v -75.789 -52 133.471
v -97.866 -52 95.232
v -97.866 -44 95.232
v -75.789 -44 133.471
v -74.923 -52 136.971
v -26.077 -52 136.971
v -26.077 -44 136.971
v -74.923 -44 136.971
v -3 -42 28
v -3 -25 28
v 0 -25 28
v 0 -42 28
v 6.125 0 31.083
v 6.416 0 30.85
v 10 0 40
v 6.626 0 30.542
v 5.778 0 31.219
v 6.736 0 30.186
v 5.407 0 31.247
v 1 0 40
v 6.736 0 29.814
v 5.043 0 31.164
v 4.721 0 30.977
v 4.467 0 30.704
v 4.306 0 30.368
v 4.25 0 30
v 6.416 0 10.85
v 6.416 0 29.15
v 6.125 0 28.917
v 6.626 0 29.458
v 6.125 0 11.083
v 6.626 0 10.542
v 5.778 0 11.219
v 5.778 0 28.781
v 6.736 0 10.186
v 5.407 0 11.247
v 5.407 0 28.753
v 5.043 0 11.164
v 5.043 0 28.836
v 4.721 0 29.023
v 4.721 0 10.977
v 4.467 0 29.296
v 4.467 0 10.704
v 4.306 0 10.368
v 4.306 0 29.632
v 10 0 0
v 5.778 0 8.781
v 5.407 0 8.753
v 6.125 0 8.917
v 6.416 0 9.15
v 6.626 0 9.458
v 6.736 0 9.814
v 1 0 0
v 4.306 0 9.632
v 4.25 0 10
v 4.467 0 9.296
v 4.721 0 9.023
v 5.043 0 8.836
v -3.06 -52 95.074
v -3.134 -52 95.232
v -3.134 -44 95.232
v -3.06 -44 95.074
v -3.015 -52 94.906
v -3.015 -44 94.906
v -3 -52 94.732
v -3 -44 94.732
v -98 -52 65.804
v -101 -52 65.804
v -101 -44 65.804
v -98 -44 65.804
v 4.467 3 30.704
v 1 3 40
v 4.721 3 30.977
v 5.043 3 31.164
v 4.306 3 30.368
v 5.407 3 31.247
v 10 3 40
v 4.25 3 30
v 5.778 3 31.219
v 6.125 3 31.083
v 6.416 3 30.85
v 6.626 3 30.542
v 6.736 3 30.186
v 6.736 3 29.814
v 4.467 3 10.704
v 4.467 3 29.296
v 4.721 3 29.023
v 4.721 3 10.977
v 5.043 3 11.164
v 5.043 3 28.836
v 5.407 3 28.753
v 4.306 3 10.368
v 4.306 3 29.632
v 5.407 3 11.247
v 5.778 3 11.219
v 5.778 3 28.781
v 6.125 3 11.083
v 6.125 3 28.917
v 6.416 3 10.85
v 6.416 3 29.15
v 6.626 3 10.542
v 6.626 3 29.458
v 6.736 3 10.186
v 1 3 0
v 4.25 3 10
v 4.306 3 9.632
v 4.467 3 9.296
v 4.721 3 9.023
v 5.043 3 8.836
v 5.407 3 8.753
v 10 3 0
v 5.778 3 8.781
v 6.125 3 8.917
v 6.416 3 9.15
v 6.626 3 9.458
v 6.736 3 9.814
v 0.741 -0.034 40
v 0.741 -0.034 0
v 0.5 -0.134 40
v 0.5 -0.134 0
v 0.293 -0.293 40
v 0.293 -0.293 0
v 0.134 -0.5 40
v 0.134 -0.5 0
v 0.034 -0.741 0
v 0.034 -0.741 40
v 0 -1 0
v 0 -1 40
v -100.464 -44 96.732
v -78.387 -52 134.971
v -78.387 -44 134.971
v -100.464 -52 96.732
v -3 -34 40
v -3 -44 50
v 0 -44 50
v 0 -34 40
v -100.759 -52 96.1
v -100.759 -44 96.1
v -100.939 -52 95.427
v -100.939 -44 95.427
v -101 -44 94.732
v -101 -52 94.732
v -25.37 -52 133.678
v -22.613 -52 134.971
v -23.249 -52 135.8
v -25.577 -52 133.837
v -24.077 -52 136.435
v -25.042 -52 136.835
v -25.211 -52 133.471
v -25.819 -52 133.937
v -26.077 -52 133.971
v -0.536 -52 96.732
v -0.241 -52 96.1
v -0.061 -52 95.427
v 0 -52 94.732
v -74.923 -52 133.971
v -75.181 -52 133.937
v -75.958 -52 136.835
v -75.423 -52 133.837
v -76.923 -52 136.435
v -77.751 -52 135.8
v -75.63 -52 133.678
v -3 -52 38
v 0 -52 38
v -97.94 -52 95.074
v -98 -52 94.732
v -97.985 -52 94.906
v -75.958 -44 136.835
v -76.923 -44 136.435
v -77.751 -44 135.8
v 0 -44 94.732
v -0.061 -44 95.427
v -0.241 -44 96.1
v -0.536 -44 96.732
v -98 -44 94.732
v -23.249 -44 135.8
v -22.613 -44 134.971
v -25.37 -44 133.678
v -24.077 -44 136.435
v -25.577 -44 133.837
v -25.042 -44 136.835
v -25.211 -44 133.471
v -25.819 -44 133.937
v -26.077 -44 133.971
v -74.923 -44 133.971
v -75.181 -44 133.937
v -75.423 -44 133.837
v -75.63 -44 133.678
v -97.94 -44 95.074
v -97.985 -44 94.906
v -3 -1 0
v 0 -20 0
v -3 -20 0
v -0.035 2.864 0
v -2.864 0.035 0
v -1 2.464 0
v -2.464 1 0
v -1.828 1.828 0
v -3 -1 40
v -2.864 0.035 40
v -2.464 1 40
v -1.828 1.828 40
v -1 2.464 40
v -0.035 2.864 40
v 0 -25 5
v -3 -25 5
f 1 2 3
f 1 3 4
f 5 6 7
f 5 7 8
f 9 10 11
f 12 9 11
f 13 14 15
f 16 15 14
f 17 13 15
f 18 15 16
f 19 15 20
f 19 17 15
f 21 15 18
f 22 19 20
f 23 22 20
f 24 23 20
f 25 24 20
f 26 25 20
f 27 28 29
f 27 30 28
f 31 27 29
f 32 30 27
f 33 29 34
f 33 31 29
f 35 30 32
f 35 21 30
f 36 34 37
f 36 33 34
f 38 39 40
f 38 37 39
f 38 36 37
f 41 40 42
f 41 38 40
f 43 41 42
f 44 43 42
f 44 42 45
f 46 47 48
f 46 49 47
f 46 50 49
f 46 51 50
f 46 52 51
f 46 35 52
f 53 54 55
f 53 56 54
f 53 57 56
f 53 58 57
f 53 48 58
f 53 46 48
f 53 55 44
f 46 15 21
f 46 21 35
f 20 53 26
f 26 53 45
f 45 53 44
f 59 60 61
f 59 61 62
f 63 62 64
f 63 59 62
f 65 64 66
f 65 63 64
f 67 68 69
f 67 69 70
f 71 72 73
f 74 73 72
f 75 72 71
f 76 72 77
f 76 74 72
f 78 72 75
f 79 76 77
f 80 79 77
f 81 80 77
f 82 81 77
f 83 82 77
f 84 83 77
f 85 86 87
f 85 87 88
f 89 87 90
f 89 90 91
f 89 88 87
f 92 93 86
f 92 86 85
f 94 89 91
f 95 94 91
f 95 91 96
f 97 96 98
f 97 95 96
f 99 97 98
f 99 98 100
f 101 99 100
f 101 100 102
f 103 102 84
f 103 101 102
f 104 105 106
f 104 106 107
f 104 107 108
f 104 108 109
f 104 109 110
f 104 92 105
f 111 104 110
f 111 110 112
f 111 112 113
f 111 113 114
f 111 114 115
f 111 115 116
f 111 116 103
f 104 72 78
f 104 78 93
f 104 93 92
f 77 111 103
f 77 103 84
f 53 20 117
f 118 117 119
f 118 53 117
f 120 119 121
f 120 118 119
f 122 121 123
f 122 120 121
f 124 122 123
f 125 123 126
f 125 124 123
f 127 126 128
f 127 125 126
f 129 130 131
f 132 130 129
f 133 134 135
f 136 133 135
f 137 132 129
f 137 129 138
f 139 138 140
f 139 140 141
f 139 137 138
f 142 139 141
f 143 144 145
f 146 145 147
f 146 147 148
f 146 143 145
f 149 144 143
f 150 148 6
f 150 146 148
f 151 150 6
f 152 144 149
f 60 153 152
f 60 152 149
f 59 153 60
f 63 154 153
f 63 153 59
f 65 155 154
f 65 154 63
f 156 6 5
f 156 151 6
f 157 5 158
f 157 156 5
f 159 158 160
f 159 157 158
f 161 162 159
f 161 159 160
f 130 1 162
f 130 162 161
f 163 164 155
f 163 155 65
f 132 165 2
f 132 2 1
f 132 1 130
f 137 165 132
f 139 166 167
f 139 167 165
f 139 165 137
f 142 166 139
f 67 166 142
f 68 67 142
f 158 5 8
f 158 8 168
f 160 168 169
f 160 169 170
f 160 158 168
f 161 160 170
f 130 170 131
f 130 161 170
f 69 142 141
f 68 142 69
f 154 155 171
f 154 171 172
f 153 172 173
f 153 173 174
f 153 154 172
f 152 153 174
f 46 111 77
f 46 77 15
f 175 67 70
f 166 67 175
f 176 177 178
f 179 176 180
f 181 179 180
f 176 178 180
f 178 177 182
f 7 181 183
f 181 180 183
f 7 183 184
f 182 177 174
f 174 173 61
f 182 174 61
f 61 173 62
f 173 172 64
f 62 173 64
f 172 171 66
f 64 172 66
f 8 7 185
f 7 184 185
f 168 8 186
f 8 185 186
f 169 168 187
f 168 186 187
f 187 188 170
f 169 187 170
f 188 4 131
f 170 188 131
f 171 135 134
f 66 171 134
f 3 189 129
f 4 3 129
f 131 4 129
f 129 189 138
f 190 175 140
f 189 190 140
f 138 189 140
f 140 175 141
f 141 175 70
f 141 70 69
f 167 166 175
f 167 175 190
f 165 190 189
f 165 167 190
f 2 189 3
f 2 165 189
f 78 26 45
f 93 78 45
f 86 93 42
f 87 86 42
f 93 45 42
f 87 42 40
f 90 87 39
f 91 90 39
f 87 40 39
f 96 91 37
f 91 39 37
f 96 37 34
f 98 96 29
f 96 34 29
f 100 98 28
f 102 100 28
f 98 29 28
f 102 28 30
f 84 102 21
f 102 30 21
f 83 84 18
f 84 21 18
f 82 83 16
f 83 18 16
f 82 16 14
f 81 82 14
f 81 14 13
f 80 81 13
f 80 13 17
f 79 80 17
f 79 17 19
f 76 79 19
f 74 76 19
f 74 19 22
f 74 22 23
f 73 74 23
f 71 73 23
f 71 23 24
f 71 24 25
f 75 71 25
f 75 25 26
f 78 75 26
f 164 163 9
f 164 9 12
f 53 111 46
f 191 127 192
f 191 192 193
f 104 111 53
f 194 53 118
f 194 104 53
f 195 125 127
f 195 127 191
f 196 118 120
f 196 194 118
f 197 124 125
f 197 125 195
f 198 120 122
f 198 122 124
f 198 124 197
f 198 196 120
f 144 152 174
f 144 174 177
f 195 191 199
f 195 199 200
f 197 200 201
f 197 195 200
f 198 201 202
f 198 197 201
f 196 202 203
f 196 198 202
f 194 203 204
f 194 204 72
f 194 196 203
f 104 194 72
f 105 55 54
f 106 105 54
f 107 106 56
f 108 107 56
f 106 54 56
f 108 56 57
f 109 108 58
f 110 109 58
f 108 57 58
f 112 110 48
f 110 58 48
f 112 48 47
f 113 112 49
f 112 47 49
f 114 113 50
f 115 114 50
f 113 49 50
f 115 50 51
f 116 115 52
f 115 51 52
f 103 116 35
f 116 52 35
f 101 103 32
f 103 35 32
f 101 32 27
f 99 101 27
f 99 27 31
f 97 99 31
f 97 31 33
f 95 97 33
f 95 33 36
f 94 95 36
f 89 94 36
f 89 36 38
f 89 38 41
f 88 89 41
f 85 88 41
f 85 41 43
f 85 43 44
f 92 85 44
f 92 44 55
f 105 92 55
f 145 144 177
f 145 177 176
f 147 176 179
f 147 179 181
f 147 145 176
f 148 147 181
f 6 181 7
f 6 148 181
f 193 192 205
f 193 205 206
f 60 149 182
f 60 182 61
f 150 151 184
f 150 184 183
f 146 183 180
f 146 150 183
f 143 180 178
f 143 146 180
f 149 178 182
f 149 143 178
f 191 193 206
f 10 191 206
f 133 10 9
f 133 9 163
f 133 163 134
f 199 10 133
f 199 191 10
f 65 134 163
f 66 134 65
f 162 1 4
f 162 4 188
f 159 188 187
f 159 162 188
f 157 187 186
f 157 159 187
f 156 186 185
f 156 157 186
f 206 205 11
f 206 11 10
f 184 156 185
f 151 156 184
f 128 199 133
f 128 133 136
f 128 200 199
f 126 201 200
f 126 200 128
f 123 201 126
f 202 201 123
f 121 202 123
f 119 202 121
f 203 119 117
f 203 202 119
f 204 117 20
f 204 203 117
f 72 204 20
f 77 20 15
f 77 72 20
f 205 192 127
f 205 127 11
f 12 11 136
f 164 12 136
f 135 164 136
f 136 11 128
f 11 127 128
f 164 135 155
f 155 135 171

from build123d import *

# Parameters (mm, degrees)
SM_BASE_FLANGE_1_DEPTH           = 40
M3X0_5_1_D                       = 2.5
SKETCH_22_W                      = 3
SKETCH_22_H                      = 12
EXTRUDE_6_DEPTH                  = 19
SKETCH_23_W                      = 3
SKETCH_23_H                      = 67
EXTRUDE_7_DEPTH                  = 8
CHAMFER_1_SIZE                   = 10
CHAMFER_2_SIZE                   = 5
SM_EDGE_FLANGE_1_STRIP_CUT_DEPTH = 8
SM_EDGE_FLANGE_1_DEPTH           = 8
SM_EDGE_FLANGE_2_STRIP_CUT_DEPTH = 8
SM_EDGE_FLANGE_2_DEPTH           = 8
SM_EDGE_FLANGE_3_STRIP_CUT_DEPTH = 8
SM_EDGE_FLANGE_3_DEPTH           = 8
SM_EDGE_FLANGE_4_STRIP_CUT_DEPTH = 8
SM_EDGE_FLANGE_4_DEPTH           = 8


# Sheet-metal steps are written as plain solids
with BuildPart() as part:
    # 草圖3 → 基材-凸緣1 (new body)
    with BuildSketch(Plane.XY):
        with BuildLine():
            Line((10, 0), (1, 0))
            ThreePointArc((1, 0), (0.292893219, -0.292893219), (0, -1))
            Line((0, -1), (0, -25))
            Line((0, -25), (-3, -25))
            Line((-3, -25), (-3, -1))
            ThreePointArc((-3, -1), (-1.828427125, 1.828427125), (1, 3))
            Line((1, 3), (10, 3))
            Line((10, 3), (10, 0))
        make_face()
    extrude(amount=SM_BASE_FLANGE_1_DEPTH)

    # M3x0.5 螺紋孔1 (through all)
    with Locations(Plane(origin=(0, 3, 0), x_dir=(1, 0, 0), z_dir=(0, 1, 0))):
        with Locations((5.5, -30), (5.5, -10)):
            Hole(M3X0_5_1_D / 2)

    # 草圖22 → 填料-伸長6 (add)
    with BuildSketch(Plane.XZ.offset(25)):
        with Locations((-1.5, 34)):
            Rectangle(SKETCH_22_W, SKETCH_22_H)
    extrude(amount=EXTRUDE_6_DEPTH)

    # 草圖23 → 填料-伸長7 (add)
    with BuildSketch(Plane.XZ.offset(44)):
        with Locations((-1.5, 61.5)):
            Rectangle(SKETCH_23_W, SKETCH_23_H)
    extrude(amount=EXTRUDE_7_DEPTH)

    # 導角1
    chamfer_1_edges = [part.edges().sort_by_distance(p)[0] for p in [
        (-1.5, -44, 40),
        (-1.5, -52, 28),
    ]]
    chamfer(chamfer_1_edges, length=CHAMFER_1_SIZE)

    # 導角2
    chamfer_2_edges = [part.edges().sort_by_distance(p)[0] for p in [
        (-1.5, -25, 0),
    ]]
    chamfer(chamfer_2_edges, length=CHAMFER_2_SIZE)

    # 邊線-凸緣1 strip (across the edge) → 邊線-凸緣1 strip cut (cut)
    with BuildSketch(Plane(origin=(-3, -52, 95), x_dir=(-0.8660254037844416, 0, -0.49999999999999495), z_dir=(0, 1, 0))):
        Polygon((-9.464101615, 10.392304845), (-2.464101615, -1.732050808), (0.133974596, -0.232050808), (-6.866025404, 11.892304845), align=None)
    extrude(amount=SM_EDGE_FLANGE_1_STRIP_CUT_DEPTH, mode=Mode.SUBTRACT)

    # 邊線-凸緣1 section (across the edge) → 邊線-凸緣1 (add)
    with BuildSketch(Plane(origin=(-3, -52, 95), x_dir=(-0.8660254037844416, 0, -0.49999999999999495), z_dir=(0, 1, 0))):
        with BuildLine():
            Line((-3, 0.267949192), (-3, 45))
            Line((-3, 45), (0, 45))
            Line((0, 45), (0, 0.267949192))
            ThreePointArc((0, 0.267949192), (0.034074174, 0.009130147), (0.133974596, -0.232050808))
            Line((0.133974596, -0.232050808), (-2.464101615, -1.732050808))
            ThreePointArc((-2.464101615, -1.732050808), (-2.863703305, -0.767326988), (-3, 0.267949192))
        make_face()
    extrude(amount=SM_EDGE_FLANGE_1_DEPTH)

    # 邊線-凸緣2 strip (across the edge) → 邊線-凸緣2 strip cut (cut)
    with BuildSketch(Plane(origin=(-25.5, -52, 133.97114317), x_dir=(0, 0, -1), z_dir=(0, 1, 0))):
        Polygon((-13.124355653, 4.113248654), (-1, -2.886751346), (0.5, -0.288675135), (-11.624355653, 6.711324865), align=None)
    extrude(amount=SM_EDGE_FLANGE_2_STRIP_CUT_DEPTH, mode=Mode.SUBTRACT)

    # 邊線-凸緣2 section (across the edge) → 邊線-凸緣2 (add)
    with BuildSketch(Plane(origin=(-25.5, -52, 133.97114317), x_dir=(0, 0, -1), z_dir=(0, 1, 0))):
        with BuildLine():
            Line((-3, 0.577350269), (-3, 50))
            Line((-3, 50), (0, 50))
            Line((0, 50), (0, 0.577350269))
            ThreePointArc((0, 0.577350269), (0.133974596, 0.077350269), (0.5, -0.288675135))
            Line((0.5, -0.288675135), (-1, -2.886751346))
            ThreePointArc((-1, -2.886751346), (-2.464101615, -1.422649731), (-3, 0.577350269))
        make_face()
    extrude(amount=SM_EDGE_FLANGE_2_DEPTH)

    # 邊線-凸緣3 strip (across the edge) → 邊線-凸緣3 strip cut (cut)
    with BuildSketch(Plane(origin=(-75.5, -52, 133.97114317), x_dir=(0.8660254037844312, -1.5023145987371476e-15, -0.5000000000000132), z_dir=(0, 1, 0))):
        Polygon((-13.124355653, 4.113248654), (-1, -2.886751346), (0.5, -0.288675135), (-11.624355653, 6.711324865), align=None)
    extrude(amount=SM_EDGE_FLANGE_3_STRIP_CUT_DEPTH, mode=Mode.SUBTRACT)

    # 邊線-凸緣3 section (across the edge) → 邊線-凸緣3 (add)
    with BuildSketch(Plane(origin=(-75.5, -52, 133.97114317), x_dir=(0.8660254037844312, -1.5023145987371476e-15, -0.5000000000000132), z_dir=(0, 1, 0))):
        with BuildLine():
            Line((-3, 0.577350269), (-3, 45))
            Line((-3, 45), (0, 45))
            Line((0, 45), (0, 0.577350269))
            ThreePointArc((0, 0.577350269), (0.133974596, 0.077350269), (0.5, -0.288675135))
            Line((0.5, -0.288675135), (-1, -2.886751346))
            ThreePointArc((-1, -2.886751346), (-2.464101615, -1.422649731), (-3, 0.577350269))
        make_face()
    extrude(amount=SM_EDGE_FLANGE_3_DEPTH)

    # 邊線-凸緣4 strip (across the edge) → 邊線-凸緣4 strip cut (cut)
    with BuildSketch(Plane(origin=(-98, -52, 95), x_dir=(1, 0, 0), z_dir=(0, 1, 0))):
        Polygon((-9.464101615, 10.392304845), (-2.464101615, -1.732050808), (0.133974596, -0.232050808), (-6.866025404, 11.892304845), align=None)
    extrude(amount=SM_EDGE_FLANGE_4_STRIP_CUT_DEPTH, mode=Mode.SUBTRACT)

    # 邊線-凸緣4 section (across the edge) → 邊線-凸緣4 (add)
    with BuildSketch(Plane(origin=(-98, -52, 95), x_dir=(1, 0, 0), z_dir=(0, 1, 0))):
        with BuildLine():
            Line((-3, 0.267949192), (-3, 29.196152423))
            Line((-3, 29.196152423), (0, 29.196152423))
            Line((0, 29.196152423), (0, 0.267949192))
            ThreePointArc((0, 0.267949192), (0.034074174, 0.009130147), (0.133974596, -0.232050808))
            Line((0.133974596, -0.232050808), (-2.464101615, -1.732050808))
            ThreePointArc((-2.464101615, -1.732050808), (-2.863703305, -0.767326988), (-3, 0.267949192))
        make_face()
    extrude(amount=SM_EDGE_FLANGE_4_DEPTH)


solid = part.part
